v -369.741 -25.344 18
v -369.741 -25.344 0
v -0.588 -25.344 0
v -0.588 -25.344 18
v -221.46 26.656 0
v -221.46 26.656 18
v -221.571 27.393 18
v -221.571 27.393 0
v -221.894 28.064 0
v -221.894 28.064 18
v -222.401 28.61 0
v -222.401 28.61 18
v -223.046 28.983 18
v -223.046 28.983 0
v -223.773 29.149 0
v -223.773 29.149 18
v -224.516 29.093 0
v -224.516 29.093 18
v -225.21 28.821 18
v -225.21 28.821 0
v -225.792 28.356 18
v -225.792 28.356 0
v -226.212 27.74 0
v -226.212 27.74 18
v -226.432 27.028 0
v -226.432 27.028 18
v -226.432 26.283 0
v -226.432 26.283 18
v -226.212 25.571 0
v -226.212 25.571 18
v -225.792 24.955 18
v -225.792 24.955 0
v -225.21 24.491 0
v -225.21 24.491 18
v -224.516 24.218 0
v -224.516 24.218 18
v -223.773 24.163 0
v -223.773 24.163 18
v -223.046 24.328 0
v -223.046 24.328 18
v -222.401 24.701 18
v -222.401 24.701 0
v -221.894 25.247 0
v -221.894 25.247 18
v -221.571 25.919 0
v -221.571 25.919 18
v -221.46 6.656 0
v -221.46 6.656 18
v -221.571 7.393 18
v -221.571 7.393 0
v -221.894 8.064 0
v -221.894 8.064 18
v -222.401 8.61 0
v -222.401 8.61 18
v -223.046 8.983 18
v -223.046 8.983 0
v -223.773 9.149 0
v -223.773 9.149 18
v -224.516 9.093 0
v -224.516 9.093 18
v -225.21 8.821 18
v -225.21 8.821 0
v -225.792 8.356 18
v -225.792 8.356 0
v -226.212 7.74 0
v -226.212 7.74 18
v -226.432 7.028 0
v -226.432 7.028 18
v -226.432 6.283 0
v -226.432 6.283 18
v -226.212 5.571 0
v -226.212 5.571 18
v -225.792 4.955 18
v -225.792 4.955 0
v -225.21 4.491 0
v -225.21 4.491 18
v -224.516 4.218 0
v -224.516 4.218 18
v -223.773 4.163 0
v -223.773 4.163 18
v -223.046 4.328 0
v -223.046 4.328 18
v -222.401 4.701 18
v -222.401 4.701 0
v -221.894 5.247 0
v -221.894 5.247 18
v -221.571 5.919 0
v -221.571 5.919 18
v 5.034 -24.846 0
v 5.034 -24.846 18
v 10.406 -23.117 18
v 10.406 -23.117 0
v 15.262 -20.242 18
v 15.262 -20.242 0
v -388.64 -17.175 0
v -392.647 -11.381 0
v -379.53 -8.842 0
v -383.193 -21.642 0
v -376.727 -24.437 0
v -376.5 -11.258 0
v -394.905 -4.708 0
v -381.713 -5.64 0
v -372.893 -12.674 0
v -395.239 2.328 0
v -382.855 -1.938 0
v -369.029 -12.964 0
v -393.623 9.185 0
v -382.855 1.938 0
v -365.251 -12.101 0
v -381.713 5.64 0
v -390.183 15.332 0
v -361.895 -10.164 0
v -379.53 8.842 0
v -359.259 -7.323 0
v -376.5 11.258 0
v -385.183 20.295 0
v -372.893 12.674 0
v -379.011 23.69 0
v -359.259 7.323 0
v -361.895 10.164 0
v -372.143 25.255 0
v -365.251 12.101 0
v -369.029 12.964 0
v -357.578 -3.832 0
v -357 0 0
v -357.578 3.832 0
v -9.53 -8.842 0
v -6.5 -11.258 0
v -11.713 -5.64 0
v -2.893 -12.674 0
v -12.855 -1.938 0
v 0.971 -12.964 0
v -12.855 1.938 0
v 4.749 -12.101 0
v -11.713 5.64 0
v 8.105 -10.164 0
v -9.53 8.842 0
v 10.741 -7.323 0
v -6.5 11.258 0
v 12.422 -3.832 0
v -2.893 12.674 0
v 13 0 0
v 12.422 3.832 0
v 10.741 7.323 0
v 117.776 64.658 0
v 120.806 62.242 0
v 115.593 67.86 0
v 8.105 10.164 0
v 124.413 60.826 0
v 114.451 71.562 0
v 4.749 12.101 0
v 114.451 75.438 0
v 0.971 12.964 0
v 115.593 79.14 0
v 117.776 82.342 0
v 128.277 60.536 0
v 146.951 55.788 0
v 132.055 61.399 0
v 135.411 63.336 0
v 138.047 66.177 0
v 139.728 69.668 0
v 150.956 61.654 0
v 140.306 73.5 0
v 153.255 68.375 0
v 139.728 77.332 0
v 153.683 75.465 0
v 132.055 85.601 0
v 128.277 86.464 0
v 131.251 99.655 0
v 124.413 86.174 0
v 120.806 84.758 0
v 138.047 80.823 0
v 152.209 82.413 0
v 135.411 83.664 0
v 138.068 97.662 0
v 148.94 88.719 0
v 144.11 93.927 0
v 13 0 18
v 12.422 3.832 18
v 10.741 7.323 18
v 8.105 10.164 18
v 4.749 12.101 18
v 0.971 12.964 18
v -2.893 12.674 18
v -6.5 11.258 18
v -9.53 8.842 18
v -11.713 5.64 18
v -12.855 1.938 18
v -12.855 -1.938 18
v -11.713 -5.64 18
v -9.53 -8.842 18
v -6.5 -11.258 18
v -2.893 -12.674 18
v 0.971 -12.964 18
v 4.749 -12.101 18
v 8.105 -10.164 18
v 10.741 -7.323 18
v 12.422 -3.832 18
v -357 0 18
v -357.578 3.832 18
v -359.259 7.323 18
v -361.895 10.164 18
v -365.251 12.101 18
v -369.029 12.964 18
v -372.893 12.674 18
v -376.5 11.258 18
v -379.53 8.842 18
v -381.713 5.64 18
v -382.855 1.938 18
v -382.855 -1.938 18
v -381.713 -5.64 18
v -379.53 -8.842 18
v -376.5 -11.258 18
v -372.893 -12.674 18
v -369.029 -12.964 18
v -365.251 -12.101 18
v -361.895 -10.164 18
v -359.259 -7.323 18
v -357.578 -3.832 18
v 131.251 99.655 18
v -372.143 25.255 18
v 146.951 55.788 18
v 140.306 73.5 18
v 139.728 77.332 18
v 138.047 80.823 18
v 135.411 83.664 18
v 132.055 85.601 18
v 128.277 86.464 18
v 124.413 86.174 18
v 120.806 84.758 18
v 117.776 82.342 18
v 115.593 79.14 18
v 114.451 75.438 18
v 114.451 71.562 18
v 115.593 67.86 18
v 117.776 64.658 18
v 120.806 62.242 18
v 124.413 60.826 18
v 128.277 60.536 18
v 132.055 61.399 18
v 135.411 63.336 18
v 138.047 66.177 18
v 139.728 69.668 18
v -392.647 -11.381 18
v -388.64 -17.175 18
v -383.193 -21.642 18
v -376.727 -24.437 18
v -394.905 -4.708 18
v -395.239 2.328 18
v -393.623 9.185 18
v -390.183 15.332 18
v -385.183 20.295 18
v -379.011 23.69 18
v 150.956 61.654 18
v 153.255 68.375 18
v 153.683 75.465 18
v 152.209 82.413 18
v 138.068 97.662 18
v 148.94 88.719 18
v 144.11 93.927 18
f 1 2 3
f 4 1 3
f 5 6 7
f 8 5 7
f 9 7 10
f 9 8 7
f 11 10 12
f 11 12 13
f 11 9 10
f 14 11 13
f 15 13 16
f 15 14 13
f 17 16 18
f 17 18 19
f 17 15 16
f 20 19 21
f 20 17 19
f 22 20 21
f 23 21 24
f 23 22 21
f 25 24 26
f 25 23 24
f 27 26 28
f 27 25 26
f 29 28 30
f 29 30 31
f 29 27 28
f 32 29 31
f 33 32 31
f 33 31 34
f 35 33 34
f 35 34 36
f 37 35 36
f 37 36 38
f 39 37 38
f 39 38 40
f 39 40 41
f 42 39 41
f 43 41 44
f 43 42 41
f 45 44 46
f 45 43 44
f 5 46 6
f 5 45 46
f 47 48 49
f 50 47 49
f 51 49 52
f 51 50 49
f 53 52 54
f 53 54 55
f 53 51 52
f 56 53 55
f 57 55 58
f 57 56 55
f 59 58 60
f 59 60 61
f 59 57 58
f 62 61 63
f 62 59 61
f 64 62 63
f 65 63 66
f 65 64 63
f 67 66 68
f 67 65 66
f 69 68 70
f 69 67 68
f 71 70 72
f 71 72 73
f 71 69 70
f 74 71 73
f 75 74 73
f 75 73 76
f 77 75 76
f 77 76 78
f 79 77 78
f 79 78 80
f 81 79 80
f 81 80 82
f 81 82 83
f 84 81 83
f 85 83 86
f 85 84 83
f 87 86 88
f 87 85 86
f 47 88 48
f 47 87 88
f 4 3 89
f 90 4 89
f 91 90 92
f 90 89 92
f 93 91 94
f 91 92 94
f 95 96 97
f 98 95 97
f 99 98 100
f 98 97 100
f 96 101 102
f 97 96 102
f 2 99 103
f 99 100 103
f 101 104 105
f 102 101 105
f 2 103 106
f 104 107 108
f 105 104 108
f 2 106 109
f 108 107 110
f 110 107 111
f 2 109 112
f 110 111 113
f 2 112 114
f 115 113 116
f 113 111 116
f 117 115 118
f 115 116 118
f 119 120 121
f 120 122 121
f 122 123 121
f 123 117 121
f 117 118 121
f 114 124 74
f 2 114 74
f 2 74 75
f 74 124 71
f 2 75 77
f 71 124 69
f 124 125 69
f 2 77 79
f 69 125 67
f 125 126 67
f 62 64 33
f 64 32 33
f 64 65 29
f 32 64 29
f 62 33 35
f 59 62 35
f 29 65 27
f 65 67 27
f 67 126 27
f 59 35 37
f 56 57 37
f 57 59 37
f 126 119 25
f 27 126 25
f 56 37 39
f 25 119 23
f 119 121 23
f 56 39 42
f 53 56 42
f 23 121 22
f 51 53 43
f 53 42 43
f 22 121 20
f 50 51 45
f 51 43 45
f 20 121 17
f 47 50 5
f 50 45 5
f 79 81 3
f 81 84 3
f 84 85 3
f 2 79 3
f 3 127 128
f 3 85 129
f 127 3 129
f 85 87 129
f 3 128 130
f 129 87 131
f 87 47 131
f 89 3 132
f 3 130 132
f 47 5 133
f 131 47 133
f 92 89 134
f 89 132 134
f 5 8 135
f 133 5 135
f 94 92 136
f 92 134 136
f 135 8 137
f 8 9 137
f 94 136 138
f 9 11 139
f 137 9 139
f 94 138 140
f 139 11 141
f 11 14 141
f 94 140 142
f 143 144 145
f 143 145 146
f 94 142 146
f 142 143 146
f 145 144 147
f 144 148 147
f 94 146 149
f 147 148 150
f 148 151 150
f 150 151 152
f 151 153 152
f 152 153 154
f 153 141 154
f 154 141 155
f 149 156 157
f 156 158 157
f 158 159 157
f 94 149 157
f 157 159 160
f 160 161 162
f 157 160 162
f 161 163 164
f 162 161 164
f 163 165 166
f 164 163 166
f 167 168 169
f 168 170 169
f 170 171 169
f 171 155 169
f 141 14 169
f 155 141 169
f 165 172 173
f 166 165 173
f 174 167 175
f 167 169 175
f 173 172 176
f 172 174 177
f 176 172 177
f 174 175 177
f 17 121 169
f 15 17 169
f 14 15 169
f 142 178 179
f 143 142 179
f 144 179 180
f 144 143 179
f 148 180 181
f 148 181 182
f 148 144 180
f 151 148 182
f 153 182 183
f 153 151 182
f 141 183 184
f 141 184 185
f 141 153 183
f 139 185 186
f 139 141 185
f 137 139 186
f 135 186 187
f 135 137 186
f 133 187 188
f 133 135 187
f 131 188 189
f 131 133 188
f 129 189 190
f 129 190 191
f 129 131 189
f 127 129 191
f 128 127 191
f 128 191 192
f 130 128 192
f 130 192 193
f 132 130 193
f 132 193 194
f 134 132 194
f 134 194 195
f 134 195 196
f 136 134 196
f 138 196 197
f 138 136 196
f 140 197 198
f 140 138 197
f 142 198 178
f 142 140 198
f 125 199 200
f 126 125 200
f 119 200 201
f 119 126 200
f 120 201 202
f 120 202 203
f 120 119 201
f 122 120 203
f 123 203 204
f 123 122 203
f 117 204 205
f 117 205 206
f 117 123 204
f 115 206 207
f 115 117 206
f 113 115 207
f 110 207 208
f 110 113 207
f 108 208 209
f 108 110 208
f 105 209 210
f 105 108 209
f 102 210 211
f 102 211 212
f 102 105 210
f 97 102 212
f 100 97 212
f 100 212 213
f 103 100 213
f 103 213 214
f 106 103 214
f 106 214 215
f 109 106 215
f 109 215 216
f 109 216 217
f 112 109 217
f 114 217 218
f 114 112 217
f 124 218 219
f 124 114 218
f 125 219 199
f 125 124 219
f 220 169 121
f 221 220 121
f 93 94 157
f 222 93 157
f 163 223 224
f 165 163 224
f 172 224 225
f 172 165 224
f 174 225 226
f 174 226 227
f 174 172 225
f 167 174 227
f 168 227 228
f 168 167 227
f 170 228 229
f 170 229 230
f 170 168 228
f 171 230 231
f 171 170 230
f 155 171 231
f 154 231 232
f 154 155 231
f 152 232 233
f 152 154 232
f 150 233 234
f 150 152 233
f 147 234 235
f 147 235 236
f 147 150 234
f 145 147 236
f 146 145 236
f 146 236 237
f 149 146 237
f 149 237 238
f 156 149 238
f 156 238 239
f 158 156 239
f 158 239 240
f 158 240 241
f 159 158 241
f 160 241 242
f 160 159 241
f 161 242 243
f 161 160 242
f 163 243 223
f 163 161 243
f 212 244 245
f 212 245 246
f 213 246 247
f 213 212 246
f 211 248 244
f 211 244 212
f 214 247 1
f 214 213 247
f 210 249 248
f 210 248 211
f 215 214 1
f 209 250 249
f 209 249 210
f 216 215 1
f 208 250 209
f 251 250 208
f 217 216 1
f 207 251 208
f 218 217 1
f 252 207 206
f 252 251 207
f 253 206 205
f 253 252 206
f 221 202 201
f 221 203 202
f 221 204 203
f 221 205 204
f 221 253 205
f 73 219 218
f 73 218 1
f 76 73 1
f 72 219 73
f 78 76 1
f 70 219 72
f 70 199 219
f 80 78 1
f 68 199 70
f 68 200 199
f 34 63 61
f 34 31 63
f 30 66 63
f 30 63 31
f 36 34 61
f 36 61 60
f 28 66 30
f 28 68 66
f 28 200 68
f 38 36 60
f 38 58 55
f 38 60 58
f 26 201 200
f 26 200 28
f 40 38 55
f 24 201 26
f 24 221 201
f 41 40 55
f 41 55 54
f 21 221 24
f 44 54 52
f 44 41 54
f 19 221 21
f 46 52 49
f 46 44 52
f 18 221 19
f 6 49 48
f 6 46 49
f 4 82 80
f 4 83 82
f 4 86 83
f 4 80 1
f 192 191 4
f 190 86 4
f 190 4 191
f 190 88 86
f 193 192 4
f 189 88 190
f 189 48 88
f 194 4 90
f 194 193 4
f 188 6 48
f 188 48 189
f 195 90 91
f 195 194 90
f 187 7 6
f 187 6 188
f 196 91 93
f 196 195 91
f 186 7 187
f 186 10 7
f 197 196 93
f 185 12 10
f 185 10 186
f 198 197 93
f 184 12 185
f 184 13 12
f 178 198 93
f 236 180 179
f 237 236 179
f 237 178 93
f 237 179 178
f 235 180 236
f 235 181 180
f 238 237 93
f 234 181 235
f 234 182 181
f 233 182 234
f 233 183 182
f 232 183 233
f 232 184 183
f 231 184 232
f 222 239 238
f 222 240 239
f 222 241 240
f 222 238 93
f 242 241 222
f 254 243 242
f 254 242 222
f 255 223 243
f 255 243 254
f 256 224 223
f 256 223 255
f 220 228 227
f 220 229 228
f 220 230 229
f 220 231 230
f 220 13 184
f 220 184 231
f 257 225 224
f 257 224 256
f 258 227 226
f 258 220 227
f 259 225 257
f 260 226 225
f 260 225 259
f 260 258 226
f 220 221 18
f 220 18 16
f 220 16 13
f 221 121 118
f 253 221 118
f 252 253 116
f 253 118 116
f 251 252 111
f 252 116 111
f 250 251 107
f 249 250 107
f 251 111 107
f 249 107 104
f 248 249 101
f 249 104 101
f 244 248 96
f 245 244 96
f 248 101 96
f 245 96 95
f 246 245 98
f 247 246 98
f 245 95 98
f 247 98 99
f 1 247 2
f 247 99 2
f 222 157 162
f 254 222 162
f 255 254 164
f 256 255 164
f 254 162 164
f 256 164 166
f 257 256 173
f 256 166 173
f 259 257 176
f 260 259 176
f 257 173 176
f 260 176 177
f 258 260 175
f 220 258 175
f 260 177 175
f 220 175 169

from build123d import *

# Parameters (mm, degrees)
ESQUISSE1_R        = 13
ESQUISSE1_R_2      = 2.5
BOSS_EXTRU_1_DEPTH = 18


with BuildPart() as part:
    # Esquisse1 → Boss.-Extru.1 (new body)
    with BuildSketch(Plane.XY):
        with BuildLine():
            Line((131.250734203, 99.6547201), (-372.143084144, 25.254923169))
            ThreePointArc((-372.143084144, 25.254923169), (-395.317180347, -1.201804157), (-369.741140617, -25.344367141))
            Line((-369.741140617, -25.344367141), (-0.588044699, -25.344367141))
            ThreePointArc((-0.588044699, -25.344367141), (7.767914285, -24.13176848), (15.262182774, -20.242245906))
            Line((15.262182774, -20.242245906), (146.950608566, 55.788102175))
            ThreePointArc((146.950608566, 55.788102175), (152.209360228, 82.413014403), (131.250734203, 99.6547201))
        make_face()
        with Locations((-370, 0)):
            Circle(ESQUISSE1_R, mode=Mode.SUBTRACT)
        with Locations((127.305734356, 73.5)):
            Circle(ESQUISSE1_R, mode=Mode.SUBTRACT)
        Circle(ESQUISSE1_R, mode=Mode.SUBTRACT)
        with Locations((-223.959522936, 6.655632859)):
            Circle(ESQUISSE1_R_2, mode=Mode.SUBTRACT)
        with Locations((-223.959522936, 26.655632859)):
            Circle(ESQUISSE1_R_2, mode=Mode.SUBTRACT)
    extrude(amount=BOSS_EXTRU_1_DEPTH)


solid = part.part
